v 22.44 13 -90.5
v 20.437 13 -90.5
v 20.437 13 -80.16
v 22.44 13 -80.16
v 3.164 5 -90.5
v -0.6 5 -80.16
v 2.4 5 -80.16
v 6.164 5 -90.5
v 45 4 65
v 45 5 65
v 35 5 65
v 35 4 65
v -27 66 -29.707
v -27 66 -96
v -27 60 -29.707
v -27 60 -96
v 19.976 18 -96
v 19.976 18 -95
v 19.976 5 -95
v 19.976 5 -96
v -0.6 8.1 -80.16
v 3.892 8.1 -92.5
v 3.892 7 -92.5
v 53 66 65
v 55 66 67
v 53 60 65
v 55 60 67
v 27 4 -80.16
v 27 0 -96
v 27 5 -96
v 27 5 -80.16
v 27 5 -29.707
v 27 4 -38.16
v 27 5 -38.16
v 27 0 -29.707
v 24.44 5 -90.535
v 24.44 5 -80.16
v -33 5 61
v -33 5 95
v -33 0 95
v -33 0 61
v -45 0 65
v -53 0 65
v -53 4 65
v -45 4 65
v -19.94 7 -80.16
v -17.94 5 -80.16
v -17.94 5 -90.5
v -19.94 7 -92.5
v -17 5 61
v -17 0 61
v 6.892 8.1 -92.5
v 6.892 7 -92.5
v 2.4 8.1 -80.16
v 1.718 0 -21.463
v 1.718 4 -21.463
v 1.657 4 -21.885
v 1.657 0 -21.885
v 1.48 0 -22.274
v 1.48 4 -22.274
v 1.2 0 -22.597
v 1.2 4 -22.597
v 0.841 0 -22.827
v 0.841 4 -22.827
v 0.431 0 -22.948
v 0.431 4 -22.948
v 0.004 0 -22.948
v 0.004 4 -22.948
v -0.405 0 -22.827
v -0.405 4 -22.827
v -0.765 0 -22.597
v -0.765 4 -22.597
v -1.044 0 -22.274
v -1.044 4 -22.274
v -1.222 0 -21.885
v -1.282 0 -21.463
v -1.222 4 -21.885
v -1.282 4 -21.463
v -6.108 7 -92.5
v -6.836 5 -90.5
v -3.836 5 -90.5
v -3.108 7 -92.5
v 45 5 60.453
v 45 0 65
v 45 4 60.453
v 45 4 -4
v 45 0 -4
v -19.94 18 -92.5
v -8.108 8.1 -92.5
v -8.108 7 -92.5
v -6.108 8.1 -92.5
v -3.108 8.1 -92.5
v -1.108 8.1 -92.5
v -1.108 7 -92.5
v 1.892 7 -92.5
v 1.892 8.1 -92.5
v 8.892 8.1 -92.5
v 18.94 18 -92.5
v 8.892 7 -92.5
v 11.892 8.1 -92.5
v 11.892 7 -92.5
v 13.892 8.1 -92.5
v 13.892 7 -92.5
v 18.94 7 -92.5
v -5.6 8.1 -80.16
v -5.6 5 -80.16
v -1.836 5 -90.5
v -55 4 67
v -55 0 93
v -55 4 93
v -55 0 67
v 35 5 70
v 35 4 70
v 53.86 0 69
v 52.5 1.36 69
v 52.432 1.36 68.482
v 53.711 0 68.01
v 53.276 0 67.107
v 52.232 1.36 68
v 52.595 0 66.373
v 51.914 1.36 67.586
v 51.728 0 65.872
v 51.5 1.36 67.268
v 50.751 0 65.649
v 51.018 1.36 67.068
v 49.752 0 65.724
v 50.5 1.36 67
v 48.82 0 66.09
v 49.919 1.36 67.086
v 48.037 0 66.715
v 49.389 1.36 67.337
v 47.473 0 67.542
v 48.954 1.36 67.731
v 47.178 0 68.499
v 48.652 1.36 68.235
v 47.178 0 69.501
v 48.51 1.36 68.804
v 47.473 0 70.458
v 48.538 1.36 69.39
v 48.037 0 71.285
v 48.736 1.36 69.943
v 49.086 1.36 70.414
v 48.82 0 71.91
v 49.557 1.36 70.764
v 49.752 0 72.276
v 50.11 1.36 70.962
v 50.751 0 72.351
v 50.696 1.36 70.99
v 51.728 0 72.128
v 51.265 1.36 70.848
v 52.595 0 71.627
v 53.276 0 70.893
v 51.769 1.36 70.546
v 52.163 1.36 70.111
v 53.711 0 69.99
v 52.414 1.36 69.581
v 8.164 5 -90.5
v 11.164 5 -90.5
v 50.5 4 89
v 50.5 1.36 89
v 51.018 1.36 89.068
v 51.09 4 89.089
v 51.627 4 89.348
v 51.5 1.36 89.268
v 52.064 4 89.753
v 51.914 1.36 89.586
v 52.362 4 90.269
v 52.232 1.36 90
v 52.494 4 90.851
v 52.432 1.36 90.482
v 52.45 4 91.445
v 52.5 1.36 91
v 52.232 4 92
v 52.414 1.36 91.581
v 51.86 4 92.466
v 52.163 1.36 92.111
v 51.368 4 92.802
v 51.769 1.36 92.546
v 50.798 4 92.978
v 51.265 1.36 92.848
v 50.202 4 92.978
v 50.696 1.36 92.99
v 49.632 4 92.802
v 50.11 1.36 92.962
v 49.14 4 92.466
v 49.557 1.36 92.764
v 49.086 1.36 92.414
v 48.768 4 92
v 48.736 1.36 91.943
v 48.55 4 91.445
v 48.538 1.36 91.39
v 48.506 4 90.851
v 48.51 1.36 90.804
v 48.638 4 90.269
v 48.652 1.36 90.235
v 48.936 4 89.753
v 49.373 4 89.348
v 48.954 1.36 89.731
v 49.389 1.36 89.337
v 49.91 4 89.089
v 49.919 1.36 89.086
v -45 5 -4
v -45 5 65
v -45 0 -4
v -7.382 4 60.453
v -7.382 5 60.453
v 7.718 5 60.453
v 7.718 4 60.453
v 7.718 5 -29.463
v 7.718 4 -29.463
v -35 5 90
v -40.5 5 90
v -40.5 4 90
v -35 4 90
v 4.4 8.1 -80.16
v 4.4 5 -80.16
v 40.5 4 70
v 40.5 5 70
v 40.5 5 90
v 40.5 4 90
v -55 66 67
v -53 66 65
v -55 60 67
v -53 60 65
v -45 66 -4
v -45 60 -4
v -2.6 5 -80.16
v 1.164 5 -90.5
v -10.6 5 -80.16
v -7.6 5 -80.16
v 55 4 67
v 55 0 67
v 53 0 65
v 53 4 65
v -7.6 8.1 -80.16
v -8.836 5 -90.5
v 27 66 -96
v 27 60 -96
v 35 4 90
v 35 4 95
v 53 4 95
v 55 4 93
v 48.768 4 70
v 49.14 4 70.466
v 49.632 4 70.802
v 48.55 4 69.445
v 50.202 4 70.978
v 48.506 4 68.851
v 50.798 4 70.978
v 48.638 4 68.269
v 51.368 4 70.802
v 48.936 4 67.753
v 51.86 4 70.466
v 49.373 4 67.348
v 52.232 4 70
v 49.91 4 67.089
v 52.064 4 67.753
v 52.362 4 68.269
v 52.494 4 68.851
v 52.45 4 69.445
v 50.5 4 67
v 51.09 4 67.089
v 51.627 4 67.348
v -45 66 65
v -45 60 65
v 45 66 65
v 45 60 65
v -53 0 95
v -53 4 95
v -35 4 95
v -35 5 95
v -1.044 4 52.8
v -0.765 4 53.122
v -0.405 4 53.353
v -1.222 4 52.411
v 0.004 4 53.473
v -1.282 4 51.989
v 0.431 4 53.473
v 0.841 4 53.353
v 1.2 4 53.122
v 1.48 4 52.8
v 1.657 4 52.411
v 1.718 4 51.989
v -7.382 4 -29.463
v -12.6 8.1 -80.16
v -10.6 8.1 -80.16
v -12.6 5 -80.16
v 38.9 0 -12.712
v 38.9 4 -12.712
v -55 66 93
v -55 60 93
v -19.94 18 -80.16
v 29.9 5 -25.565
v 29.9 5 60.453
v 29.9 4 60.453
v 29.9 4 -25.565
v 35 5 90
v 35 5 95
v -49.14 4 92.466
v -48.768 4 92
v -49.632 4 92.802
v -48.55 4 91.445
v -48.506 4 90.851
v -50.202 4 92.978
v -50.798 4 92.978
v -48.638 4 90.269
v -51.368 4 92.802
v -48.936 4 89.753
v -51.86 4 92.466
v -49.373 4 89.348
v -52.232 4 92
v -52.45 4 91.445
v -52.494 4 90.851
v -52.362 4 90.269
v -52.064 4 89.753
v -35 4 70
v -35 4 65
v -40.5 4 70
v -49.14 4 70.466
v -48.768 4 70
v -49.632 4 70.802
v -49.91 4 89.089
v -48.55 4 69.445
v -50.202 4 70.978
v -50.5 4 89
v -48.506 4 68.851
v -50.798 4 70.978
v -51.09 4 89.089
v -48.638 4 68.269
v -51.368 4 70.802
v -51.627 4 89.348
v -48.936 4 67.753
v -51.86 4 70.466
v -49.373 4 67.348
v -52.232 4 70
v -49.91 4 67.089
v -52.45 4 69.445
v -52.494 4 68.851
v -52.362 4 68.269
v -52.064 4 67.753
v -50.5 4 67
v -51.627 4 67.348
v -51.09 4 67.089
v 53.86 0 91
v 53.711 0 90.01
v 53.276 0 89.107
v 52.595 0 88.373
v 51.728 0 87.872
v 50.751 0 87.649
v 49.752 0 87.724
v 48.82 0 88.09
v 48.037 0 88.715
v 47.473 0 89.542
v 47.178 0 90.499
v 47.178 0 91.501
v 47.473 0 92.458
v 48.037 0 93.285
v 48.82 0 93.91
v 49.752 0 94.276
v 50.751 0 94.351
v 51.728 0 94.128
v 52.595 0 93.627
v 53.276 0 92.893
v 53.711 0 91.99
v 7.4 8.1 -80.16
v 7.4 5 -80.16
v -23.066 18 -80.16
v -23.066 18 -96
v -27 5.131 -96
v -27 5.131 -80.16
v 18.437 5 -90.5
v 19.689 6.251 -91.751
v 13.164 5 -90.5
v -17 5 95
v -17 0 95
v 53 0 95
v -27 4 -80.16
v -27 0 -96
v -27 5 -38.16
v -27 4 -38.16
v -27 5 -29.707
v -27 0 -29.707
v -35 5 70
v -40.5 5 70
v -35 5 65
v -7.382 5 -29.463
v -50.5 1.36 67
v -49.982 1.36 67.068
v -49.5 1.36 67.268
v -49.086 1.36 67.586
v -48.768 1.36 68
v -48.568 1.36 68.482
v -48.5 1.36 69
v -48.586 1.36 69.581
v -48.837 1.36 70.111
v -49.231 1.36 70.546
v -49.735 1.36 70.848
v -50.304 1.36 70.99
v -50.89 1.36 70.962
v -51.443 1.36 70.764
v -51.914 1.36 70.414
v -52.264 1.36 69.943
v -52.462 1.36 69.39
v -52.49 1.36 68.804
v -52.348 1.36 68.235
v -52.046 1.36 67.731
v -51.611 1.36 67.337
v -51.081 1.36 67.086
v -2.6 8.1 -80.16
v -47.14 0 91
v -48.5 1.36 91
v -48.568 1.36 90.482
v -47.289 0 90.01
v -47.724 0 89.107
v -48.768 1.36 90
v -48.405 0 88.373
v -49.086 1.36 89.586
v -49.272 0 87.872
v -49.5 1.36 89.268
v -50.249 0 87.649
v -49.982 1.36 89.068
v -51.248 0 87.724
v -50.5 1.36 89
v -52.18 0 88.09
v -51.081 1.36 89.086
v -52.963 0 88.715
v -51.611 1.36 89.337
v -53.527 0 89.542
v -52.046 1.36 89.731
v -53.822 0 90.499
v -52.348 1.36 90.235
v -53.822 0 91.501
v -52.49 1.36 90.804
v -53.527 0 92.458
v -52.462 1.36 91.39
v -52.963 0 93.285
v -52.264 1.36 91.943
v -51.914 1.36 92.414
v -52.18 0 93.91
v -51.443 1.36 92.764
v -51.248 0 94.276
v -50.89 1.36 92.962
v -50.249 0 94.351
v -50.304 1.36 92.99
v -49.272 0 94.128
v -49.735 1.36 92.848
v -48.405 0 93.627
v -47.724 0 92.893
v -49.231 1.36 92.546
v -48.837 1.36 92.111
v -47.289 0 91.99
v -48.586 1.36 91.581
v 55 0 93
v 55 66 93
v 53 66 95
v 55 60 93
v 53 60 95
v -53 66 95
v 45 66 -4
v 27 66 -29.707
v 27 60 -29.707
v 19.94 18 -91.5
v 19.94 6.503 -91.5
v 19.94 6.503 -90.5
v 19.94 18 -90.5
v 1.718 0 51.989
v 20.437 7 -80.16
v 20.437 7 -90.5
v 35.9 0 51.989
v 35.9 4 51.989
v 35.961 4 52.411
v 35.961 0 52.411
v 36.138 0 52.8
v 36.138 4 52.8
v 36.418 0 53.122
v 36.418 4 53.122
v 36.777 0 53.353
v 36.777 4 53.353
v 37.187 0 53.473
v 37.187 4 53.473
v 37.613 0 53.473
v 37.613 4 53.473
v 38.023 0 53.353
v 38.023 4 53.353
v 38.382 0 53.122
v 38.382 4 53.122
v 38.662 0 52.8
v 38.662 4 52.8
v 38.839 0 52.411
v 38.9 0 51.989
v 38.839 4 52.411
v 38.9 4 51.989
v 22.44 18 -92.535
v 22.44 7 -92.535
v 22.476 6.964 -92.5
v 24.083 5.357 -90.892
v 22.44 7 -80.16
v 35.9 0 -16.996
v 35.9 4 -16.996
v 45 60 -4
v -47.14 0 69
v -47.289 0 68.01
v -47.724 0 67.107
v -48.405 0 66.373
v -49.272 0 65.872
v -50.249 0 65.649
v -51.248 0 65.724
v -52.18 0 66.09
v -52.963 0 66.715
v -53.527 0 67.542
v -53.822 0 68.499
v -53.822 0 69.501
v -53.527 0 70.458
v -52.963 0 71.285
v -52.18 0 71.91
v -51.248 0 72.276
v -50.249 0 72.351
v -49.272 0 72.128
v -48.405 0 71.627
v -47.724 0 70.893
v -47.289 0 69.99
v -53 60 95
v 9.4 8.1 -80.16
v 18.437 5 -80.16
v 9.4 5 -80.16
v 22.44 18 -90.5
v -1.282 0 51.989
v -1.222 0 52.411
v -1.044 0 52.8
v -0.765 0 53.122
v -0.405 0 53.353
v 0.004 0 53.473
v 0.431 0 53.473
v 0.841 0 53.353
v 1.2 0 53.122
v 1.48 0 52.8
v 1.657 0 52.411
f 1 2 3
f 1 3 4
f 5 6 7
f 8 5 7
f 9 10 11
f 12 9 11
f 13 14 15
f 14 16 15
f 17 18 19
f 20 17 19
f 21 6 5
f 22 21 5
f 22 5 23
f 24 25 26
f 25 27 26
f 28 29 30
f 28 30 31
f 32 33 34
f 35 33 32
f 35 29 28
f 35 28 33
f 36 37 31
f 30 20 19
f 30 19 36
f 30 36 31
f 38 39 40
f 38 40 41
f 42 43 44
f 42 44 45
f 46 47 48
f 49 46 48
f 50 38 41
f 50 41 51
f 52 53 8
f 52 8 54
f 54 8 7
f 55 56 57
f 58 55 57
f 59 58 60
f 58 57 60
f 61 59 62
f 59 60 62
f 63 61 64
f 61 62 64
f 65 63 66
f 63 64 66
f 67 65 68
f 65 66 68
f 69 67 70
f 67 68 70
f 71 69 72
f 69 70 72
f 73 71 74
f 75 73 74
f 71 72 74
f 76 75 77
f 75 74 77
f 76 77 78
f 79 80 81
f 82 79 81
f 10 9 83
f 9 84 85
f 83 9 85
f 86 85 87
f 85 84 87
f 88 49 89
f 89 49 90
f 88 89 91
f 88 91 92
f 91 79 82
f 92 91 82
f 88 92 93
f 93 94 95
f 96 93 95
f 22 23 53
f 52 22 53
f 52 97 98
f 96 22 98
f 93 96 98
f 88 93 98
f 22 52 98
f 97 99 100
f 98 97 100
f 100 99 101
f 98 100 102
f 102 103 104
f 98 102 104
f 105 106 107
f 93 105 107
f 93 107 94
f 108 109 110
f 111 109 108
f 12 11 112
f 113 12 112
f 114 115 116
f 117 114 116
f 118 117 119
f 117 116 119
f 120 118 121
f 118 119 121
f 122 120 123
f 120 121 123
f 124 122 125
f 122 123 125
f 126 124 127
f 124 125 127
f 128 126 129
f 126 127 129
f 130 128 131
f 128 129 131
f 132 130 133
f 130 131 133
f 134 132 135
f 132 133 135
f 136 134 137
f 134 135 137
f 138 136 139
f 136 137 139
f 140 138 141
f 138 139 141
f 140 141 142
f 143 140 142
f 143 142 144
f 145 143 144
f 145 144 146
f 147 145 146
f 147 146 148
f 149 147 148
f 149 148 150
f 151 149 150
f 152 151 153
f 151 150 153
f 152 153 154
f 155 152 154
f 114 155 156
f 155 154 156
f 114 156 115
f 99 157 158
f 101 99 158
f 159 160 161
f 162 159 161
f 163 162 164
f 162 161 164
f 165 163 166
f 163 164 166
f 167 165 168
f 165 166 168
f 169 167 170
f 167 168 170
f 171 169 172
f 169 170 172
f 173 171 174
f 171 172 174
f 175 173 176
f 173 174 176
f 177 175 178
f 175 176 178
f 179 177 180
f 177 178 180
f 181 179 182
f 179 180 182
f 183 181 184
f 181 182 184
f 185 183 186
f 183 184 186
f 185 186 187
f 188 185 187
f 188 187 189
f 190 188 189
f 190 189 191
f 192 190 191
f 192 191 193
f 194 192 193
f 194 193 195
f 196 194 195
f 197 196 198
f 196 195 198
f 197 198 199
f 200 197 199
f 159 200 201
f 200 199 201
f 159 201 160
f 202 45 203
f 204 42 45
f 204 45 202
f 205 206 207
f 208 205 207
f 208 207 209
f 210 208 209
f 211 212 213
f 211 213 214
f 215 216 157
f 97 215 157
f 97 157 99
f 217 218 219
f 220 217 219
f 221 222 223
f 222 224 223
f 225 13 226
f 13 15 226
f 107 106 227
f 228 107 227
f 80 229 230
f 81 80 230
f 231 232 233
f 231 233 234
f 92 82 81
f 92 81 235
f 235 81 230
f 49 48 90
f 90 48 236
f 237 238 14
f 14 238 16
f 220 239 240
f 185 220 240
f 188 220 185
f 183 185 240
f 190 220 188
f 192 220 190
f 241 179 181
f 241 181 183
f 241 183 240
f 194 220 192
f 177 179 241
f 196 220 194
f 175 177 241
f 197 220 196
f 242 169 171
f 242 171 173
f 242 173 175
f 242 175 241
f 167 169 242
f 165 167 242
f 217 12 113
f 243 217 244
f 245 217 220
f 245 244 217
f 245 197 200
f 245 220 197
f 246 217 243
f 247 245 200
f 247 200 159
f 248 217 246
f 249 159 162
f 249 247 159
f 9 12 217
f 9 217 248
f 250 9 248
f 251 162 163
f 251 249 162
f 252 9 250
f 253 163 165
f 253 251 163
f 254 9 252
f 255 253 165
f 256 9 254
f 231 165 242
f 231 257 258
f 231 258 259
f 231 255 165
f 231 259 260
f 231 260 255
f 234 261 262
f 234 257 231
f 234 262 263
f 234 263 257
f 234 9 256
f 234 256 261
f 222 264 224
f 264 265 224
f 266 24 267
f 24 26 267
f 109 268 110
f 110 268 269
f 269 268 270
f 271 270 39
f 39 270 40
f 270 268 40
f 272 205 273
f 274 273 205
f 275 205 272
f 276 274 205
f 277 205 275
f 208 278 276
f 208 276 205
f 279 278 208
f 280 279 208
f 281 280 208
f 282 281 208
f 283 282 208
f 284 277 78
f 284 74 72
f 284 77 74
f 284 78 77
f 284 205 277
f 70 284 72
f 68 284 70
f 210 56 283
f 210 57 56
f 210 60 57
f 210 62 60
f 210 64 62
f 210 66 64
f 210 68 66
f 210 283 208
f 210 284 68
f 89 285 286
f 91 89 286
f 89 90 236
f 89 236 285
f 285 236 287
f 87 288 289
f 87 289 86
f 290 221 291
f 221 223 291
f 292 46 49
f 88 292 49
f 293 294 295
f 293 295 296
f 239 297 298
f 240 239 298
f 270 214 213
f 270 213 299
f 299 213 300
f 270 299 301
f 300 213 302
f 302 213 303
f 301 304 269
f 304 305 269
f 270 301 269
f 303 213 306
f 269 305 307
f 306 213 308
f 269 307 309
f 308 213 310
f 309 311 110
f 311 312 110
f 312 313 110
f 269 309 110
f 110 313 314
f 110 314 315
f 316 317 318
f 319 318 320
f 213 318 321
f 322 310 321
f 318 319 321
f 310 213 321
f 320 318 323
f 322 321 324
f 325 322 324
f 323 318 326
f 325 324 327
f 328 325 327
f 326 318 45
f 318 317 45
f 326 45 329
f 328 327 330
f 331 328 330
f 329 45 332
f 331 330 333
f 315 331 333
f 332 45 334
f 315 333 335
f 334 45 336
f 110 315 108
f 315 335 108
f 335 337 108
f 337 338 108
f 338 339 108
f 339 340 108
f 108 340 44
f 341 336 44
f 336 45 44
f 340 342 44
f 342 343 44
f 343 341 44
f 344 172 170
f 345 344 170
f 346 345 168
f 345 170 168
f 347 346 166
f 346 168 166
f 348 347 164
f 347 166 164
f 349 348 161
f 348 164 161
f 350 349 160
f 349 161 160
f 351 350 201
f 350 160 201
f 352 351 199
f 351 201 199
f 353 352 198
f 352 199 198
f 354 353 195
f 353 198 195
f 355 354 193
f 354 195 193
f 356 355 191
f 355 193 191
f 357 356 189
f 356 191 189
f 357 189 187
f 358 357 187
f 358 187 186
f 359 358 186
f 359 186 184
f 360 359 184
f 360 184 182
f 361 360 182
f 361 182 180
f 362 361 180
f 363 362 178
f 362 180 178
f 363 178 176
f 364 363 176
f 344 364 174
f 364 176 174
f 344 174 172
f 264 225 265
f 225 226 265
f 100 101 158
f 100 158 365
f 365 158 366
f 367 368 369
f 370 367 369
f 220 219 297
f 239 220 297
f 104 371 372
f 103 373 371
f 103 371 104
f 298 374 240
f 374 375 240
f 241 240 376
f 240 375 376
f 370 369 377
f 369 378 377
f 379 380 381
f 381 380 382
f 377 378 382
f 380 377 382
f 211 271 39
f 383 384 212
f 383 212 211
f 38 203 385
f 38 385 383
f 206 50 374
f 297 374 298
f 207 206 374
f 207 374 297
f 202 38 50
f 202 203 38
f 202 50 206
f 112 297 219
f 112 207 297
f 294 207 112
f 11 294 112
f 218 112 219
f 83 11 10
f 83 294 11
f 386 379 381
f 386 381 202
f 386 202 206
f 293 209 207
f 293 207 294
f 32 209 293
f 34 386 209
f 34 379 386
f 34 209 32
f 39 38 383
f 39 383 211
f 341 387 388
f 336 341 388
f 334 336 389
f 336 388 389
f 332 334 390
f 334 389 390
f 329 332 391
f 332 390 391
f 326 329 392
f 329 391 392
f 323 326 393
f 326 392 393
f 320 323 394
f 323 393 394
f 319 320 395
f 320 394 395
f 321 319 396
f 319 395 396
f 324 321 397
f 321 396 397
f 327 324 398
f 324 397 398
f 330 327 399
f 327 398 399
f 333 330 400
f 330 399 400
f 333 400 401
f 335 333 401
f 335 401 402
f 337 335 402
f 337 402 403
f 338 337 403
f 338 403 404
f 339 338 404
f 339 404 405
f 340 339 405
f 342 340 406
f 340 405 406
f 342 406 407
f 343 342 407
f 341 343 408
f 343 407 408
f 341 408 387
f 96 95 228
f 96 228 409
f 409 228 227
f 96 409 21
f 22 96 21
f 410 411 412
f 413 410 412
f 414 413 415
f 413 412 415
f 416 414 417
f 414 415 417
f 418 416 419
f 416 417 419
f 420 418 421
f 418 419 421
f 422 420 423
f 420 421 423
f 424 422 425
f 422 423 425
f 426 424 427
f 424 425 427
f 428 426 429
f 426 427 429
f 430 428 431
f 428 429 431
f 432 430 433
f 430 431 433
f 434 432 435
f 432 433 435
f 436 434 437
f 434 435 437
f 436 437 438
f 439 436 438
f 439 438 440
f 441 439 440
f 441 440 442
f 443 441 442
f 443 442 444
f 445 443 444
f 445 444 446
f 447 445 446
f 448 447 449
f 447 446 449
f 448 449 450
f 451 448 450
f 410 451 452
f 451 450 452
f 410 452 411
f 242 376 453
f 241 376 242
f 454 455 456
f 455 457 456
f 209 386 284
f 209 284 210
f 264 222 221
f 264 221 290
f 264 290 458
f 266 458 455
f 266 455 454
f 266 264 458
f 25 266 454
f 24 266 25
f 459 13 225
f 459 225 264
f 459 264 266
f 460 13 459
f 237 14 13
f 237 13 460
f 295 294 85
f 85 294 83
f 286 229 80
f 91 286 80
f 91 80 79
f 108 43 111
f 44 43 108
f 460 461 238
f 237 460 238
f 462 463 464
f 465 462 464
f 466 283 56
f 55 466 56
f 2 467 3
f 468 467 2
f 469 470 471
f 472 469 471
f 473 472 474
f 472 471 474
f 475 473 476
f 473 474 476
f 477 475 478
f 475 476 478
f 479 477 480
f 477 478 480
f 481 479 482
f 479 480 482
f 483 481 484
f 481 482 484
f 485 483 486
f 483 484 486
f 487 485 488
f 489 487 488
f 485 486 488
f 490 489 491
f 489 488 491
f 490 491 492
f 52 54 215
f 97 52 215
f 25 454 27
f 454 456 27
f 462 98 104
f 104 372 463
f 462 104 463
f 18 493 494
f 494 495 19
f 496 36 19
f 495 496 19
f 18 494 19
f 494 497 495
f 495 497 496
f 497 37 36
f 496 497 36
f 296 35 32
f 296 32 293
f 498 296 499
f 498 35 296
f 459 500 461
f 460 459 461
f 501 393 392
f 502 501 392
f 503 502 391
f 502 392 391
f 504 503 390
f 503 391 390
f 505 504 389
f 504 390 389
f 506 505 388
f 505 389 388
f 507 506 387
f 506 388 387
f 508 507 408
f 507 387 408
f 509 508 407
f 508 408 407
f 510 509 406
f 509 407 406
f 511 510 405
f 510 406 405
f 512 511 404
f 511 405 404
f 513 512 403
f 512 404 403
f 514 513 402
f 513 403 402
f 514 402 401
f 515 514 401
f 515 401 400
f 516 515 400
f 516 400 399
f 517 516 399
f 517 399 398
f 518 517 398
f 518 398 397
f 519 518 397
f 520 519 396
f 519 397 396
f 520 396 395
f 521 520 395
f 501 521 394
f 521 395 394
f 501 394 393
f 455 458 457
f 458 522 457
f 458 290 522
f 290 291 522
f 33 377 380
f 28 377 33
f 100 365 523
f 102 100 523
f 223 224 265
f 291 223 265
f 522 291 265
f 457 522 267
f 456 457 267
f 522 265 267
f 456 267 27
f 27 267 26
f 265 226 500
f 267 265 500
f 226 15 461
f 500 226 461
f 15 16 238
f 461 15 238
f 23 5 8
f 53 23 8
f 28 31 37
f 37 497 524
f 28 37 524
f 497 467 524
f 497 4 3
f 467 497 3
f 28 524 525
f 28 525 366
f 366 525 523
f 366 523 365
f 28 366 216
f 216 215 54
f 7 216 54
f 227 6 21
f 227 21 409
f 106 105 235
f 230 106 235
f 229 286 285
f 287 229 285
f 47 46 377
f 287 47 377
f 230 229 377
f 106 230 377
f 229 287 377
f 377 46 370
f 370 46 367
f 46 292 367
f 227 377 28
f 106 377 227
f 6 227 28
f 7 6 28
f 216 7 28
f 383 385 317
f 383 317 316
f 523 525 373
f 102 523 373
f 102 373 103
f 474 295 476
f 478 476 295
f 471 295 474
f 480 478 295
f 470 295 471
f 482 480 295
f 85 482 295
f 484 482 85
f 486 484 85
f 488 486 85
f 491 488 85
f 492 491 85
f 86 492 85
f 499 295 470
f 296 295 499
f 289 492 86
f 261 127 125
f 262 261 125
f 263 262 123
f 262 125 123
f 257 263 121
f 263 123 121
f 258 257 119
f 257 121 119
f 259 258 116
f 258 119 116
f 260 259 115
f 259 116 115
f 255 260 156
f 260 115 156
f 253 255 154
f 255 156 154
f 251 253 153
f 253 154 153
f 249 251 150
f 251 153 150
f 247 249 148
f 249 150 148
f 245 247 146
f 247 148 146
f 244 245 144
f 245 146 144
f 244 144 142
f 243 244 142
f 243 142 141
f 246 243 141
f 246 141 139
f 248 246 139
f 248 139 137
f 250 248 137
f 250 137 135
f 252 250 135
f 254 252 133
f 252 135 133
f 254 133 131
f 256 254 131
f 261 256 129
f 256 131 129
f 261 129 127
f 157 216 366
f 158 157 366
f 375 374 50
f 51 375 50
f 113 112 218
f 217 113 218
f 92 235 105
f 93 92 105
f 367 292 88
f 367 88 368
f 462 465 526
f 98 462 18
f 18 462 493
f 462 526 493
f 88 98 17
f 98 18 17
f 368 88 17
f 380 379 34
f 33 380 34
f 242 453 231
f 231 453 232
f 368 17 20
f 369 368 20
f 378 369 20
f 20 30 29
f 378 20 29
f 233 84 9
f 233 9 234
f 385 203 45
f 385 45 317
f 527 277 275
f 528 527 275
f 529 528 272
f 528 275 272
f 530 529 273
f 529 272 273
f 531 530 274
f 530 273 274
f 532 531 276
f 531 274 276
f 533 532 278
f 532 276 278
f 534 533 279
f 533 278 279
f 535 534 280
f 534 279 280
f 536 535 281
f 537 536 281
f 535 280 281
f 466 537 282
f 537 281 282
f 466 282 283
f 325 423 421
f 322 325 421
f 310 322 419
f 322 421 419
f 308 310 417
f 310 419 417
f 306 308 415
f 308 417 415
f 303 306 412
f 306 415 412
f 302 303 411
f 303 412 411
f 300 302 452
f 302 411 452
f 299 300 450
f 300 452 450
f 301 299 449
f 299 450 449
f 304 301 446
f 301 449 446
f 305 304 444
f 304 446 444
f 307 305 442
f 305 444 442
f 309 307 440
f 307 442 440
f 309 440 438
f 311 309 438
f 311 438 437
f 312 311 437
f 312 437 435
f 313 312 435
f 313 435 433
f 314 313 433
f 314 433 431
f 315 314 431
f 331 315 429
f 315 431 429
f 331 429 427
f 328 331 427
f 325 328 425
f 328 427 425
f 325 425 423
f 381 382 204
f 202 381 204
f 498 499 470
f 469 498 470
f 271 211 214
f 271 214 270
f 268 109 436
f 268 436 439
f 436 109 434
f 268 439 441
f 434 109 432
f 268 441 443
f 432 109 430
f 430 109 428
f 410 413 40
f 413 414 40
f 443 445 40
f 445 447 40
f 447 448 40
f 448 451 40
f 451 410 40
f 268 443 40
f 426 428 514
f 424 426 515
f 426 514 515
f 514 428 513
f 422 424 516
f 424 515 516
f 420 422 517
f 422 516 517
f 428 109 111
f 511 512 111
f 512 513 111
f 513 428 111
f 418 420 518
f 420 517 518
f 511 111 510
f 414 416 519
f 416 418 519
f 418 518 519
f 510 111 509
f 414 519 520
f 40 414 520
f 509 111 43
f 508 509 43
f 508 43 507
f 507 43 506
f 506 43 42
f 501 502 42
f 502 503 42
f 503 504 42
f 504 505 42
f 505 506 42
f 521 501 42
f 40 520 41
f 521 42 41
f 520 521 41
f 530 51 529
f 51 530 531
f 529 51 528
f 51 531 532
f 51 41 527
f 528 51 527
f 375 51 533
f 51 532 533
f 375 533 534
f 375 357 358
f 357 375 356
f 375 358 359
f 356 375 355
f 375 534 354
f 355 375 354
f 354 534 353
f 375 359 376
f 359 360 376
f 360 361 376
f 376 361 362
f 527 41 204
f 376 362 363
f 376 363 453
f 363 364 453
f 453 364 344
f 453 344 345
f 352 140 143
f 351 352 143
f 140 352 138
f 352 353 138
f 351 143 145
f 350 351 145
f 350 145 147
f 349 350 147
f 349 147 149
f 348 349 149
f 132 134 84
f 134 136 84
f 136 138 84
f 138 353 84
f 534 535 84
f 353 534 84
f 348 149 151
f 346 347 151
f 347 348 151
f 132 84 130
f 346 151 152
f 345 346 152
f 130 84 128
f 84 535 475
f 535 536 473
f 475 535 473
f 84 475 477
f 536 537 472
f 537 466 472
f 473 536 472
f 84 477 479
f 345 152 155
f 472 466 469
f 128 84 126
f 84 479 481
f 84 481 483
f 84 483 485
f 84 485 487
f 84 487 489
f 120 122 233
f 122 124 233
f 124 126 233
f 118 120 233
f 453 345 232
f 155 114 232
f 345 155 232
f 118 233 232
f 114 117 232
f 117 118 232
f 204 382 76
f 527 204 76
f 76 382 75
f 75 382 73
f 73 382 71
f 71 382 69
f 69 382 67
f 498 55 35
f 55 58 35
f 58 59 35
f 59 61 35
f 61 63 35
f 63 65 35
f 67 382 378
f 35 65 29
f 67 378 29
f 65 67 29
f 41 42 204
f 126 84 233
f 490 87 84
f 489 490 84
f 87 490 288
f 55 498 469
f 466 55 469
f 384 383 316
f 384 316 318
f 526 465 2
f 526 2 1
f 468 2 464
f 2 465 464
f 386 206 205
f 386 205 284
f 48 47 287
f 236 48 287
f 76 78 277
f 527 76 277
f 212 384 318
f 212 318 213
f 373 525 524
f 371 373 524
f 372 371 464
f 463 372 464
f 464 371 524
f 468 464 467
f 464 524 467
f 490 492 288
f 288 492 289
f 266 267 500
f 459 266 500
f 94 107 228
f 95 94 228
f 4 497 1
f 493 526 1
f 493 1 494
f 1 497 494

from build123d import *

# Parameters (mm, degrees)
SKETCH1_W                     = 90
SKETCH1_H                     = 190
BOSS_EXTRUDE1_DEPTH           = 5
SKETCH2_W                     = 10
SKETCH2_H                     = 30
BOSS_EXTRUDE2_DEPTH           = 5
CHAMFER1_SIZE                 = 2
SKETCH3_W                     = 16
SKETCH3_H                     = 34
CUT_EXTRUDE1_DEPTH            = 50
SKETCH4_W                     = 90
SKETCH4_H                     = 42
CUT_EXTRUDE2_DEPTH            = 1
SKETCH7_W                     = 15.1
SKETCH7_H                     = 89.916335477
CUT_EXTRUDE7_DEPTH            = 1
BOSS_EXTRUDE4_START           = 5
BOSS_EXTRUDE4_DEPTH           = 13
BOSS_EXTRUDE5_DEPTH           = 3.1
CUT_EXTRUDE11_START           = 5
CUT_EXTRUDE11_DEPTH           = 1
CUT_EXTRUDE12_DEPTH           = 112.23848255
CUT_EXTRUDE12_DEPTH_BACK      = 112.23848255
BOSS_EXTRUDE6_DEPTH           = 1
CHAMFER4_SIZE                 = 2
CUT_EXTRUDE13_REACH           = 114.094
SKETCH23_R                    = 2
CUT_EXTRUDE14_DEPTH           = 113.093556715
CUT_EXTRUDE14_DEPTH_BACK      = 113.093556715
SKETCH27_W                    = 2.002698481
SKETCH27_H                    = 10.340179912
BOSS_EXTRUDE7_DEPTH           = 8
CHAMFER5_SIZE                 = 2
CHAMFER6_SIZE                 = 15.045922045
CHAMFER6_SIZE_2               = 4.6
CHAMFER7_SIZE                 = 2
CSK_FOR_M3_SFHCS1_D           = 3.4
CSK_FOR_M3_SFHCS1_DEPTH       = 4
CSK_FOR_M3_SFHCS1_CSINK_D     = 6.72
CSK_FOR_M3_SFHCS1_CSINK_ANGLE = 90
CSK_FOR_M3_SFHCS1_TIP         = 1.021463052
BOSS_EXTRUDE8_START           = 60
BOSS_EXTRUDE8_DEPTH           = 4
BOSS_EXTRUDE9_DEPTH           = 2


with BuildPart() as part:
    # Sketch1 → Boss-Extrude1 (new body)
    with BuildSketch(Plane(origin=(0, 0, 0), x_dir=(1, 0, 0), z_dir=(0, 1, 0))):
        Rectangle(SKETCH1_W, SKETCH1_H)
    extrude(amount=BOSS_EXTRUDE1_DEPTH)

    # Sketch2 → Boss-Extrude2 (add)
    with BuildSketch(Plane(origin=(0, 0, 0), x_dir=(1, 0, 0), z_dir=(0, 1, 0))):
        with Locations((-50, -80)):
            Rectangle(SKETCH2_W, SKETCH2_H)
        with Locations((50, -80)):
            Rectangle(SKETCH2_W, SKETCH2_H)
    extrude(amount=BOSS_EXTRUDE2_DEPTH)

    # Chamfer1
    chamfer1_edges = [part.edges().sort_by_distance(p)[0] for p in [
        (-55, 2.5, 65),
        (-55, 2.5, 95),
        (55, 2.5, 95),
        (55, 2.5, 65),
    ]]
    chamfer(chamfer1_edges, length=CHAMFER1_SIZE)

    # Sketch3 → Cut-Extrude1 (cut)
    with BuildSketch(Plane(origin=(0, 5, 0), x_dir=(1, 0, 0), z_dir=(0, 1, 0))):
        with Locations((-25, -78)):
            Rectangle(SKETCH3_W, SKETCH3_H)
    extrude(amount=-CUT_EXTRUDE1_DEPTH, mode=Mode.SUBTRACT)

    # Sketch4 → Cut-Extrude2 (cut)
    with BuildSketch(Plane(origin=(0, 5, 0), x_dir=(1, 0, 0), z_dir=(0, 1, 0))):
        with Locations((0, 59.159820088)):
            Rectangle(SKETCH4_W, SKETCH4_H)
    extrude(amount=-CUT_EXTRUDE2_DEPTH, mode=Mode.SUBTRACT)

    # Sketch7 → Cut-Extrude7 (cut)
    with BuildSketch(Plane(origin=(0, 5, 0), x_dir=(1, 0, 0), z_dir=(0, 1, 0))):
        with Locations((37.45, -15.495273531)):
            Rectangle(SKETCH7_W, SKETCH7_H)
        with Locations((0.16773297, -15.495273531)):
            Rectangle(SKETCH7_W, SKETCH7_H)
    extrude(amount=-CUT_EXTRUDE7_DEPTH, mode=Mode.SUBTRACT)

    # Sketch17 → Boss-Extrude4 (add)
    with BuildSketch(Plane(origin=(0, 0, 0), x_dir=(1, 0, 0), z_dir=(0, 1, 0)).offset(BOSS_EXTRUDE4_START)):
        Polygon((-22.440023983, 80.159820088), (-19.940023983, 80.159820088), (-19.940023983, 92.499820088), (18.940023983, 92.499820088), (19.940023983, 91.499820088), (19.940023983, 90.5), (22.440023983, 90.5), (22.440023983, 92.535353994), (19.975557889, 94.999820088), (-22.440023983, 94.999820088), align=None)
    extrude(amount=BOSS_EXTRUDE4_DEPTH)

    # Sketch18 → Boss-Extrude5 (add)
    with BuildSketch(Plane(origin=(0, 5, 0), x_dir=(1, 0, 0), z_dir=(0, 1, 0))):
        Polygon((-12.599634528, 80.159820088), (-10.599634528, 80.159820088), (-6.108241837, 92.499820088), (-8.108241837, 92.499820088), align=None)
        Polygon((-3.108241837, 92.499820088), (-7.599634528, 80.159820088), (-5.599634528, 80.159820088), (-1.108241837, 92.499820088), align=None)
        Polygon((1.891758163, 92.499820088), (-2.599634528, 80.159820088), (-0.599634528, 80.159820088), (3.891758163, 92.499820088), align=None)
        Polygon((6.891758163, 92.499820088), (2.400365472, 80.159820088), (4.400365472, 80.159820088), (8.891758163, 92.499820088), align=None)
        Polygon((11.891758163, 92.499820088), (7.400365472, 80.159820088), (9.400365472, 80.159820088), (13.891758163, 92.499820088), align=None)
    extrude(amount=BOSS_EXTRUDE5_DEPTH)

    # Sketch19 → Cut-Extrude11 (cut)
    with BuildSketch(Plane(origin=(0, 0, 0), x_dir=(1, 0, 0), z_dir=(0, 1, 0)).offset(CUT_EXTRUDE11_START)):
        Polygon((-35, -65), (-35, -70), (-40.5, -70), (-40.5, -90), (-35, -90), (-35, -95), (-53, -95), (-55, -93), (-55, -67), (-53, -65), align=None)
    cut_extrude11 = extrude(amount=-CUT_EXTRUDE11_DEPTH, mode=Mode.SUBTRACT)

    # Mirror1: Cut-Extrude11 across plane
    add(cut_extrude11.mirror(Plane(origin=(0, 0, 0), x_dir=(0, 0, 1), z_dir=(1, 0, 0))), mode=Mode.SUBTRACT)

    # Sketch20 → Cut-Extrude12 (cut, two sides: drawn at the far end of the back side and taken through both)
    with BuildSketch(Plane(origin=(0, 0, 0), x_dir=(1, 0, 0), z_dir=(0, 1, 0)).offset(-CUT_EXTRUDE12_DEPTH_BACK)):
        Polygon((-27, 29.706664121), (-45, 4), (-45, 95), (-27, 95), align=None)
        Polygon((27, 95), (27, 29.706664121), (45, 4), (45, 95), align=None)
    extrude(amount=CUT_EXTRUDE12_DEPTH + CUT_EXTRUDE12_DEPTH_BACK, mode=Mode.SUBTRACT)

    # Sketch22 → Boss-Extrude6 (add)
    with BuildSketch(Plane(origin=(0, 0, -94.999820088), x_dir=(-1, 0, 0), z_dir=(0, 0, -1))):
        Polygon((-19.975557889, 5), (-27, 5), (-27, 0), (27, 0), (27, 5), (22.440023983, 5), (22.440023983, 18), (-19.975557889, 18), align=None)
    extrude(amount=BOSS_EXTRUDE6_DEPTH)

    # Chamfer4
    chamfer4_edges = [part.edges().sort_by_distance(p)[0] for p in [
        (-19.940023983, 5, -86.329820088),
        (-14.02413291, 5, -92.499820088),
        (-4.608241837, 5, -92.499820088),
        (0.391758163, 5, -92.499820088),
        (5.391758163, 5, -92.499820088),
        (10.391758163, 5, -92.499820088),
    ]]
    chamfer(chamfer4_edges, length=CHAMFER4_SIZE)

    # Sketch23 → Cut-Extrude13 (cut, up to next)
    with BuildSketch(Plane.XZ, mode=Mode.PRIVATE) as cut_extrude13_sk1:
        with Locations(Location((-50.5, 91, 0), (0, 0, 270))):
            Circle(SKETCH23_R)
    cut_extrude13_tool1 = extrude(cut_extrude13_sk1.sketch, amount=-CUT_EXTRUDE13_REACH, mode=Mode.PRIVATE) & part.part
    # Sketch23 → Cut-Extrude13 (cut, up to next)
    with BuildSketch(Plane.XZ, mode=Mode.PRIVATE) as cut_extrude13_sk2:
        with Locations(Location((-50.5, 69, 0), (0, 0, 270))):
            Circle(SKETCH23_R)
    cut_extrude13_tool2 = extrude(cut_extrude13_sk2.sketch, amount=-CUT_EXTRUDE13_REACH, mode=Mode.PRIVATE) & part.part
    # Sketch23 → Cut-Extrude13 (cut, up to next)
    with BuildSketch(Plane.XZ, mode=Mode.PRIVATE) as cut_extrude13_sk3:
        with Locations(Location((50.5, 69, 0), (0, 0, 270))):
            Circle(SKETCH23_R)
    cut_extrude13_tool3 = extrude(cut_extrude13_sk3.sketch, amount=-CUT_EXTRUDE13_REACH, mode=Mode.PRIVATE) & part.part
    # Sketch23 → Cut-Extrude13 (cut, up to next)
    with BuildSketch(Plane.XZ, mode=Mode.PRIVATE) as cut_extrude13_sk4:
        with Locations(Location((50.5, 91, 0), (0, 0, 270))):
            Circle(SKETCH23_R)
    cut_extrude13_tool4 = extrude(cut_extrude13_sk4.sketch, amount=-CUT_EXTRUDE13_REACH, mode=Mode.PRIVATE) & part.part
    add(cut_extrude13_tool1.solids().sort_by_distance((-50.5, 0, 91))[0], mode=Mode.SUBTRACT)
    add(cut_extrude13_tool2.solids().sort_by_distance((-50.5, 0, 69))[0], mode=Mode.SUBTRACT)
    add(cut_extrude13_tool3.solids().sort_by_distance((50.5, 0, 69))[0], mode=Mode.SUBTRACT)
    add(cut_extrude13_tool4.solids().sort_by_distance((50.5, 0, 91))[0], mode=Mode.SUBTRACT)

    # Sketch25 → Cut-Extrude14 (cut, two sides: drawn at the far end of the back side and taken through both)
    with BuildSketch(Plane.XZ.offset(-CUT_EXTRUDE14_DEPTH_BACK)):
        with BuildLine():
            Line((1.71773297, 51.988728589), (1.71773297, -21.462894208))
            ThreePointArc((1.71773297, -21.462894208), (0.21773297, -22.962894208), (-1.28226703, -21.462894208))
            Line((-1.28226703, -21.462894208), (-1.28226703, 51.988728589))
            ThreePointArc((-1.28226703, 51.988728589), (0.21773297, 53.488728589), (1.71773297, 51.988728589))
        make_face()
        with BuildLine():
            Line((38.9, 51.988728589), (38.9, -21.462894208))
            ThreePointArc((38.9, -21.462894208), (37.4, -22.962894208), (35.9, -21.462894208))
            Line((35.9, -21.462894208), (35.9, 51.988728589))
            ThreePointArc((35.9, 51.988728589), (37.4, 53.488728589), (38.9, 51.988728589))
        make_face()
    extrude(amount=CUT_EXTRUDE14_DEPTH + CUT_EXTRUDE14_DEPTH_BACK, mode=Mode.SUBTRACT)

    # Sketch27 → Boss-Extrude7 (add)
    with BuildSketch(Plane(origin=(0, 5, 0), x_dir=(1, 0, 0), z_dir=(0, 1, 0))):
        with Locations((21.438674742, 85.329910044)):
            Rectangle(SKETCH27_W, SKETCH27_H)
    extrude(amount=BOSS_EXTRUDE7_DEPTH)

    # Chamfer5
    chamfer5_edges = [part.edges().sort_by_distance(p)[0] for p in [
        (22.440023983, 5, -86.347587041),
    ]]
    chamfer(chamfer5_edges, length=CHAMFER5_SIZE)

    # Chamfer6
    # the kernel refuses this chamfer: 15.045922045, 4.6 mm, written as the material it adds along each edge
    with BuildSketch(Plane(origin=(-22.440023983, 5, -80.159820088), x_dir=(0.011263281176818154, 0.9999365672367082, 0), z_dir=(0, 0, -1))) as chamfer6_piece_1_section:
        Polygon((CHAMFER6_SIZE * 0.999936567239, -CHAMFER6_SIZE * 0.0112632811768), (-CHAMFER6_SIZE_2 * 0.0112632811768, -CHAMFER6_SIZE_2 * 0.999936567237), (0, 0), align=None)
    chamfer6_piece_1 = extrude(amount=15.84, mode=Mode.PRIVATE)
    chamfer6_piece_1 = split(chamfer6_piece_1, bisect_by=Plane(origin=(-23.998082586, 18, -88.079820088), z_dir=(0, -1, 0)), keep=Keep.TOP, mode=Mode.PRIVATE)
    chamfer6_piece_1 = split(chamfer6_piece_1, bisect_by=Plane(origin=(-27, 9.852411417, -88.079820088), z_dir=(1, 0, 0)), keep=Keep.TOP, mode=Mode.PRIVATE)
    add(chamfer6_piece_1)

    # Chamfer7
    # the kernel refuses this chamfer: 2 mm, written as the material it adds along each edge
    with BuildSketch(Plane(origin=(8.748392187, 5, -92.499820088), x_dir=(-2.155664593802373e-14, -0.027495876610586414, 0.9996219169112968), z_dir=(1, 0, 0))) as chamfer7_piece_1_section:
        Polygon((CHAMFER7_SIZE * 0.999621916911, -CHAMFER7_SIZE * 0.0274958766106), (-CHAMFER7_SIZE * 0.0274958766106, -CHAMFER7_SIZE * 0.999621916911), (0, 0), align=None)
    chamfer7_piece_1 = extrude(amount=15.334997772, mode=Mode.PRIVATE)
    chamfer7_piece_1 = split(chamfer7_piece_1, bisect_by=Plane(origin=(20.49595334, 8.944070643, -90.499940029), z_dir=(-0.7071067811865476, -0.7071067811865476, -1.2691553730131522e-15)), keep=Keep.TOP, mode=Mode.PRIVATE)
    chamfer7_piece_1 = split(chamfer7_piece_1, bisect_by=Plane(origin=(20.513690307, 5.000059971, -94.46168767), z_dir=(-0.7071067811865465, 0, 0.7071067811865486)), keep=Keep.TOP, mode=Mode.PRIVATE)
    add(chamfer7_piece_1)
    with BuildSketch(Plane(origin=(20.437325502, 5, -80.159820088), x_dir=(-0.9996219169112968, -0.02749587661058651, 0), z_dir=(0, 0, -1))) as chamfer7_piece_2_section:
        Polygon((CHAMFER7_SIZE * 0.999621916911, CHAMFER7_SIZE * 0.0274958766106), (-CHAMFER7_SIZE * 0.0274958766106, CHAMFER7_SIZE * 0.999621916911), (0, 0), align=None)
    chamfer7_piece_2 = extrude(amount=15.483545888, mode=Mode.PRIVATE)
    chamfer7_piece_2 = split(chamfer7_piece_2, bisect_by=Plane(origin=(24.542296211, 5.500899494, -90.433081766), z_dir=(-0.7071067811865465, 0, 0.7071067811865486)), keep=Keep.TOP, mode=Mode.PRIVATE)
    add(chamfer7_piece_2)

    # CSK for M3 SFHCS1
    with Locations(Plane(origin=(0, 0, 0), x_dir=(-1, 0, 0), z_dir=(0, -1, 0))):
        with Locations((-50.5, -91), (-50.5, -69), (50.5, -69), (50.5, -91)):
            CounterSinkHole(CSK_FOR_M3_SFHCS1_D / 2, CSK_FOR_M3_SFHCS1_CSINK_D / 2, depth=CSK_FOR_M3_SFHCS1_DEPTH, counter_sink_angle=CSK_FOR_M3_SFHCS1_CSINK_ANGLE)
            with Locations((0, 0, -(CSK_FOR_M3_SFHCS1_DEPTH + CSK_FOR_M3_SFHCS1_TIP / 2))):  # 118° drill point
                Cone(0, CSK_FOR_M3_SFHCS1_D / 2, CSK_FOR_M3_SFHCS1_TIP, mode=Mode.SUBTRACT)


with BuildPart() as body_2:
    # Sketch31 → Boss-Extrude8 (new body)
    with BuildSketch(Plane(origin=(0, 0, 0), x_dir=(1, 0, 0), z_dir=(0, 1, 0)).offset(BOSS_EXTRUDE8_START)):
        Polygon((-27, 95.999820088), (-27, 29.706664121), (-45, 4), (-45, -65), (-53, -65), (-55, -67), (-55, -93), (-53, -95), (53, -95), (55, -93), (55, -67), (53, -65), (45, -65), (45, 4), (27, 29.706664121), (27, 95.999820088), align=None)
    extrude(amount=BOSS_EXTRUDE8_DEPTH)

    # Sketch32 → Boss-Extrude9 (add)
    with BuildSketch(Plane(origin=(0, 64, 0), x_dir=(1, 0, 0), z_dir=(0, 1, 0))):
        Polygon((27, 29.706664121), (27, 95.999820088), (-27, 95.999820088), (-27, 29.706664121), (-45, 4), (-45, -65), (-53, -65), (-55, -67), (-55, -93), (-53, -95), (53, -95), (55, -93), (55, -67), (53, -65), (45, -65), (45, 4), align=None)
    extrude(amount=BOSS_EXTRUDE9_DEPTH)


solid = Compound([part.part, body_2.part])
